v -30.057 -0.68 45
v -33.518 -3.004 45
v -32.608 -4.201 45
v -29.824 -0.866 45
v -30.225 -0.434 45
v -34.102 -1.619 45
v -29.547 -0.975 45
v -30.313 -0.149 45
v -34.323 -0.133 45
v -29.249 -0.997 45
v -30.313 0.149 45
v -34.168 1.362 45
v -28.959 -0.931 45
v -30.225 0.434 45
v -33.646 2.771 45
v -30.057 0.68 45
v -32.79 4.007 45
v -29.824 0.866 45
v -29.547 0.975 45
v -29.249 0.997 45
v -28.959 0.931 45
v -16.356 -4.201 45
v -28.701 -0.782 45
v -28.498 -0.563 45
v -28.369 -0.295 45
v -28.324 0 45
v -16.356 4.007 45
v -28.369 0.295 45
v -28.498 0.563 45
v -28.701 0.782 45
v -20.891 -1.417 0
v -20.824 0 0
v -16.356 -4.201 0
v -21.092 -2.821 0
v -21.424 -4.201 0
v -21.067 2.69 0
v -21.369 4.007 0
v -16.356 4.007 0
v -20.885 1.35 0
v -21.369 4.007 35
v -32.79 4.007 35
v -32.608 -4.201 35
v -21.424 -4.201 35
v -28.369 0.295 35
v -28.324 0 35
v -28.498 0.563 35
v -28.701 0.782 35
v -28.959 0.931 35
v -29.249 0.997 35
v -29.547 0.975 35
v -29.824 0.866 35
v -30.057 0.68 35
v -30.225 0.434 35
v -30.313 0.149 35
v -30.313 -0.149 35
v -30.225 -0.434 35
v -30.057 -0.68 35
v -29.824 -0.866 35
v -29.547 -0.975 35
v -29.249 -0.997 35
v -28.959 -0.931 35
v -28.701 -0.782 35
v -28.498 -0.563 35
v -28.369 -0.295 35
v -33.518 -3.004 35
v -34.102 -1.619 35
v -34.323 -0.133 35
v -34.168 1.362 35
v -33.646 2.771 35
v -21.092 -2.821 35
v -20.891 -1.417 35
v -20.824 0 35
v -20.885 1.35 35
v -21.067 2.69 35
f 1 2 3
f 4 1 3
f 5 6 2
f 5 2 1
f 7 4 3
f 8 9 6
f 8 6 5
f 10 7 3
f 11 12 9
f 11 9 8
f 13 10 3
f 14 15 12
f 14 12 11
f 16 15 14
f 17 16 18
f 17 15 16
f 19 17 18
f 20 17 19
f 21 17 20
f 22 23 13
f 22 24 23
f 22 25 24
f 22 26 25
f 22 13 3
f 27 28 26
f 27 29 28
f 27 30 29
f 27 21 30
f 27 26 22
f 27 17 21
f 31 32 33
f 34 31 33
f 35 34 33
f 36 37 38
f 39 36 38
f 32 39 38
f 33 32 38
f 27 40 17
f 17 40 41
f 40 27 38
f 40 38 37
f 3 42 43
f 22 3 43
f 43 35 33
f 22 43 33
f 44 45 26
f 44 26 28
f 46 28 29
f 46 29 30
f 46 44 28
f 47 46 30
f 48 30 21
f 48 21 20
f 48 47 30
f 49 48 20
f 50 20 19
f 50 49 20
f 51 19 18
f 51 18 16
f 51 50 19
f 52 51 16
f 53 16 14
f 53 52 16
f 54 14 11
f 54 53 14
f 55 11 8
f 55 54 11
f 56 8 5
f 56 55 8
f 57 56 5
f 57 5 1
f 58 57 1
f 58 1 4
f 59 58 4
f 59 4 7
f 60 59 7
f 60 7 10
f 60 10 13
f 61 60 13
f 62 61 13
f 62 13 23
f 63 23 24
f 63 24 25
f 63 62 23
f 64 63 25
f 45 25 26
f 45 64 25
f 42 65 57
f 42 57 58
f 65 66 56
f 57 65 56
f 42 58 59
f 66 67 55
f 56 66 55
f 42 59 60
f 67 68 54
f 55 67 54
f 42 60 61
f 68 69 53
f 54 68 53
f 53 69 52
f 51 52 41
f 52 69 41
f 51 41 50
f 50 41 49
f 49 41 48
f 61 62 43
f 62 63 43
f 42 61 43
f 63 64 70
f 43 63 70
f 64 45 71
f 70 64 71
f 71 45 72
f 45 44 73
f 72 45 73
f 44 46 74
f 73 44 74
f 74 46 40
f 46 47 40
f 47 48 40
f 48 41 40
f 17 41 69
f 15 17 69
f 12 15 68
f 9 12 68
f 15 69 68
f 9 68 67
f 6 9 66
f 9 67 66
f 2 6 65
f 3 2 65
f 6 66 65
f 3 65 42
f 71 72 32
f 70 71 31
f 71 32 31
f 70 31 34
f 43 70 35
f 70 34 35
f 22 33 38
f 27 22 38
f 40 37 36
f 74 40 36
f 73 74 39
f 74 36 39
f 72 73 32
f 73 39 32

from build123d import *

# Parameters (mm, degrees)
F1_DEPTH = 35
F2_R     = 1
F3_DEPTH = 10


# Not quite as in the source:
# - a feature names something its author has since deleted; it is built from what else it names


with BuildPart() as f1:
    # F0 (on Top) → F1 (new body)
    with BuildSketch(Plane.XY):
        with BuildLine():
            ThreePointArc((-21.369307128, 4.0069422022), (-20.961114092, 2.0219241613), (-20.8242168194, 0))
            ThreePointArc((-20.8242168194, 0), (-20.9750189274, -2.1216319103), (-21.4243930811, -4.2006042786))
            Line((-21.4243930811, -4.2006042786), (-16.3557600736, -4.2006042786))
            Line((-16.3557600736, -4.2006042786), (-16.3557600736, 4.0069422022))
            Line((-16.3557600736, 4.0069422022), (-21.369307128, 4.0069422022))
        make_face()
    extrude(amount=F1_DEPTH)

    # F2 (on face) → F3 (join)
    with BuildSketch(Plane.XY.offset(35)):
        with BuildLine():
            Line((-16.3557600736, -4.2006042786), (-16.3557600736, 4.0069422022))
            Line((-16.3557600736, 4.0069422022), (-21.369307128, 4.0069422022))
            ThreePointArc((-21.369307128, 4.0069422022), (-20.8245546521, -0.1006720692), (-21.4243930811, -4.2006042786))
            Line((-21.4243930811, -4.2006042786), (-16.3557600736, -4.2006042786))
        make_face()
        with BuildLine():
            ThreePointArc((-21.4243930811, -4.2006042786), (-20.8245546521, -0.1006720692), (-21.369307128, 4.0069422022))
            Line((-21.369307128, 4.0069422022), (-32.7901337676, 4.0069422022))
            ThreePointArc((-32.7901337676, 4.0069422022), (-34.3227478364, -0.1327615841), (-32.6084814815, -4.2006042786))
            Line((-32.6084814815, -4.2006042786), (-21.4243930811, -4.2006042786))
        make_face()
        with Locations((-29.3242168194, 0)):
            Circle(F2_R, mode=Mode.SUBTRACT)
    extrude(amount=F3_DEPTH)


solid = f1.part
